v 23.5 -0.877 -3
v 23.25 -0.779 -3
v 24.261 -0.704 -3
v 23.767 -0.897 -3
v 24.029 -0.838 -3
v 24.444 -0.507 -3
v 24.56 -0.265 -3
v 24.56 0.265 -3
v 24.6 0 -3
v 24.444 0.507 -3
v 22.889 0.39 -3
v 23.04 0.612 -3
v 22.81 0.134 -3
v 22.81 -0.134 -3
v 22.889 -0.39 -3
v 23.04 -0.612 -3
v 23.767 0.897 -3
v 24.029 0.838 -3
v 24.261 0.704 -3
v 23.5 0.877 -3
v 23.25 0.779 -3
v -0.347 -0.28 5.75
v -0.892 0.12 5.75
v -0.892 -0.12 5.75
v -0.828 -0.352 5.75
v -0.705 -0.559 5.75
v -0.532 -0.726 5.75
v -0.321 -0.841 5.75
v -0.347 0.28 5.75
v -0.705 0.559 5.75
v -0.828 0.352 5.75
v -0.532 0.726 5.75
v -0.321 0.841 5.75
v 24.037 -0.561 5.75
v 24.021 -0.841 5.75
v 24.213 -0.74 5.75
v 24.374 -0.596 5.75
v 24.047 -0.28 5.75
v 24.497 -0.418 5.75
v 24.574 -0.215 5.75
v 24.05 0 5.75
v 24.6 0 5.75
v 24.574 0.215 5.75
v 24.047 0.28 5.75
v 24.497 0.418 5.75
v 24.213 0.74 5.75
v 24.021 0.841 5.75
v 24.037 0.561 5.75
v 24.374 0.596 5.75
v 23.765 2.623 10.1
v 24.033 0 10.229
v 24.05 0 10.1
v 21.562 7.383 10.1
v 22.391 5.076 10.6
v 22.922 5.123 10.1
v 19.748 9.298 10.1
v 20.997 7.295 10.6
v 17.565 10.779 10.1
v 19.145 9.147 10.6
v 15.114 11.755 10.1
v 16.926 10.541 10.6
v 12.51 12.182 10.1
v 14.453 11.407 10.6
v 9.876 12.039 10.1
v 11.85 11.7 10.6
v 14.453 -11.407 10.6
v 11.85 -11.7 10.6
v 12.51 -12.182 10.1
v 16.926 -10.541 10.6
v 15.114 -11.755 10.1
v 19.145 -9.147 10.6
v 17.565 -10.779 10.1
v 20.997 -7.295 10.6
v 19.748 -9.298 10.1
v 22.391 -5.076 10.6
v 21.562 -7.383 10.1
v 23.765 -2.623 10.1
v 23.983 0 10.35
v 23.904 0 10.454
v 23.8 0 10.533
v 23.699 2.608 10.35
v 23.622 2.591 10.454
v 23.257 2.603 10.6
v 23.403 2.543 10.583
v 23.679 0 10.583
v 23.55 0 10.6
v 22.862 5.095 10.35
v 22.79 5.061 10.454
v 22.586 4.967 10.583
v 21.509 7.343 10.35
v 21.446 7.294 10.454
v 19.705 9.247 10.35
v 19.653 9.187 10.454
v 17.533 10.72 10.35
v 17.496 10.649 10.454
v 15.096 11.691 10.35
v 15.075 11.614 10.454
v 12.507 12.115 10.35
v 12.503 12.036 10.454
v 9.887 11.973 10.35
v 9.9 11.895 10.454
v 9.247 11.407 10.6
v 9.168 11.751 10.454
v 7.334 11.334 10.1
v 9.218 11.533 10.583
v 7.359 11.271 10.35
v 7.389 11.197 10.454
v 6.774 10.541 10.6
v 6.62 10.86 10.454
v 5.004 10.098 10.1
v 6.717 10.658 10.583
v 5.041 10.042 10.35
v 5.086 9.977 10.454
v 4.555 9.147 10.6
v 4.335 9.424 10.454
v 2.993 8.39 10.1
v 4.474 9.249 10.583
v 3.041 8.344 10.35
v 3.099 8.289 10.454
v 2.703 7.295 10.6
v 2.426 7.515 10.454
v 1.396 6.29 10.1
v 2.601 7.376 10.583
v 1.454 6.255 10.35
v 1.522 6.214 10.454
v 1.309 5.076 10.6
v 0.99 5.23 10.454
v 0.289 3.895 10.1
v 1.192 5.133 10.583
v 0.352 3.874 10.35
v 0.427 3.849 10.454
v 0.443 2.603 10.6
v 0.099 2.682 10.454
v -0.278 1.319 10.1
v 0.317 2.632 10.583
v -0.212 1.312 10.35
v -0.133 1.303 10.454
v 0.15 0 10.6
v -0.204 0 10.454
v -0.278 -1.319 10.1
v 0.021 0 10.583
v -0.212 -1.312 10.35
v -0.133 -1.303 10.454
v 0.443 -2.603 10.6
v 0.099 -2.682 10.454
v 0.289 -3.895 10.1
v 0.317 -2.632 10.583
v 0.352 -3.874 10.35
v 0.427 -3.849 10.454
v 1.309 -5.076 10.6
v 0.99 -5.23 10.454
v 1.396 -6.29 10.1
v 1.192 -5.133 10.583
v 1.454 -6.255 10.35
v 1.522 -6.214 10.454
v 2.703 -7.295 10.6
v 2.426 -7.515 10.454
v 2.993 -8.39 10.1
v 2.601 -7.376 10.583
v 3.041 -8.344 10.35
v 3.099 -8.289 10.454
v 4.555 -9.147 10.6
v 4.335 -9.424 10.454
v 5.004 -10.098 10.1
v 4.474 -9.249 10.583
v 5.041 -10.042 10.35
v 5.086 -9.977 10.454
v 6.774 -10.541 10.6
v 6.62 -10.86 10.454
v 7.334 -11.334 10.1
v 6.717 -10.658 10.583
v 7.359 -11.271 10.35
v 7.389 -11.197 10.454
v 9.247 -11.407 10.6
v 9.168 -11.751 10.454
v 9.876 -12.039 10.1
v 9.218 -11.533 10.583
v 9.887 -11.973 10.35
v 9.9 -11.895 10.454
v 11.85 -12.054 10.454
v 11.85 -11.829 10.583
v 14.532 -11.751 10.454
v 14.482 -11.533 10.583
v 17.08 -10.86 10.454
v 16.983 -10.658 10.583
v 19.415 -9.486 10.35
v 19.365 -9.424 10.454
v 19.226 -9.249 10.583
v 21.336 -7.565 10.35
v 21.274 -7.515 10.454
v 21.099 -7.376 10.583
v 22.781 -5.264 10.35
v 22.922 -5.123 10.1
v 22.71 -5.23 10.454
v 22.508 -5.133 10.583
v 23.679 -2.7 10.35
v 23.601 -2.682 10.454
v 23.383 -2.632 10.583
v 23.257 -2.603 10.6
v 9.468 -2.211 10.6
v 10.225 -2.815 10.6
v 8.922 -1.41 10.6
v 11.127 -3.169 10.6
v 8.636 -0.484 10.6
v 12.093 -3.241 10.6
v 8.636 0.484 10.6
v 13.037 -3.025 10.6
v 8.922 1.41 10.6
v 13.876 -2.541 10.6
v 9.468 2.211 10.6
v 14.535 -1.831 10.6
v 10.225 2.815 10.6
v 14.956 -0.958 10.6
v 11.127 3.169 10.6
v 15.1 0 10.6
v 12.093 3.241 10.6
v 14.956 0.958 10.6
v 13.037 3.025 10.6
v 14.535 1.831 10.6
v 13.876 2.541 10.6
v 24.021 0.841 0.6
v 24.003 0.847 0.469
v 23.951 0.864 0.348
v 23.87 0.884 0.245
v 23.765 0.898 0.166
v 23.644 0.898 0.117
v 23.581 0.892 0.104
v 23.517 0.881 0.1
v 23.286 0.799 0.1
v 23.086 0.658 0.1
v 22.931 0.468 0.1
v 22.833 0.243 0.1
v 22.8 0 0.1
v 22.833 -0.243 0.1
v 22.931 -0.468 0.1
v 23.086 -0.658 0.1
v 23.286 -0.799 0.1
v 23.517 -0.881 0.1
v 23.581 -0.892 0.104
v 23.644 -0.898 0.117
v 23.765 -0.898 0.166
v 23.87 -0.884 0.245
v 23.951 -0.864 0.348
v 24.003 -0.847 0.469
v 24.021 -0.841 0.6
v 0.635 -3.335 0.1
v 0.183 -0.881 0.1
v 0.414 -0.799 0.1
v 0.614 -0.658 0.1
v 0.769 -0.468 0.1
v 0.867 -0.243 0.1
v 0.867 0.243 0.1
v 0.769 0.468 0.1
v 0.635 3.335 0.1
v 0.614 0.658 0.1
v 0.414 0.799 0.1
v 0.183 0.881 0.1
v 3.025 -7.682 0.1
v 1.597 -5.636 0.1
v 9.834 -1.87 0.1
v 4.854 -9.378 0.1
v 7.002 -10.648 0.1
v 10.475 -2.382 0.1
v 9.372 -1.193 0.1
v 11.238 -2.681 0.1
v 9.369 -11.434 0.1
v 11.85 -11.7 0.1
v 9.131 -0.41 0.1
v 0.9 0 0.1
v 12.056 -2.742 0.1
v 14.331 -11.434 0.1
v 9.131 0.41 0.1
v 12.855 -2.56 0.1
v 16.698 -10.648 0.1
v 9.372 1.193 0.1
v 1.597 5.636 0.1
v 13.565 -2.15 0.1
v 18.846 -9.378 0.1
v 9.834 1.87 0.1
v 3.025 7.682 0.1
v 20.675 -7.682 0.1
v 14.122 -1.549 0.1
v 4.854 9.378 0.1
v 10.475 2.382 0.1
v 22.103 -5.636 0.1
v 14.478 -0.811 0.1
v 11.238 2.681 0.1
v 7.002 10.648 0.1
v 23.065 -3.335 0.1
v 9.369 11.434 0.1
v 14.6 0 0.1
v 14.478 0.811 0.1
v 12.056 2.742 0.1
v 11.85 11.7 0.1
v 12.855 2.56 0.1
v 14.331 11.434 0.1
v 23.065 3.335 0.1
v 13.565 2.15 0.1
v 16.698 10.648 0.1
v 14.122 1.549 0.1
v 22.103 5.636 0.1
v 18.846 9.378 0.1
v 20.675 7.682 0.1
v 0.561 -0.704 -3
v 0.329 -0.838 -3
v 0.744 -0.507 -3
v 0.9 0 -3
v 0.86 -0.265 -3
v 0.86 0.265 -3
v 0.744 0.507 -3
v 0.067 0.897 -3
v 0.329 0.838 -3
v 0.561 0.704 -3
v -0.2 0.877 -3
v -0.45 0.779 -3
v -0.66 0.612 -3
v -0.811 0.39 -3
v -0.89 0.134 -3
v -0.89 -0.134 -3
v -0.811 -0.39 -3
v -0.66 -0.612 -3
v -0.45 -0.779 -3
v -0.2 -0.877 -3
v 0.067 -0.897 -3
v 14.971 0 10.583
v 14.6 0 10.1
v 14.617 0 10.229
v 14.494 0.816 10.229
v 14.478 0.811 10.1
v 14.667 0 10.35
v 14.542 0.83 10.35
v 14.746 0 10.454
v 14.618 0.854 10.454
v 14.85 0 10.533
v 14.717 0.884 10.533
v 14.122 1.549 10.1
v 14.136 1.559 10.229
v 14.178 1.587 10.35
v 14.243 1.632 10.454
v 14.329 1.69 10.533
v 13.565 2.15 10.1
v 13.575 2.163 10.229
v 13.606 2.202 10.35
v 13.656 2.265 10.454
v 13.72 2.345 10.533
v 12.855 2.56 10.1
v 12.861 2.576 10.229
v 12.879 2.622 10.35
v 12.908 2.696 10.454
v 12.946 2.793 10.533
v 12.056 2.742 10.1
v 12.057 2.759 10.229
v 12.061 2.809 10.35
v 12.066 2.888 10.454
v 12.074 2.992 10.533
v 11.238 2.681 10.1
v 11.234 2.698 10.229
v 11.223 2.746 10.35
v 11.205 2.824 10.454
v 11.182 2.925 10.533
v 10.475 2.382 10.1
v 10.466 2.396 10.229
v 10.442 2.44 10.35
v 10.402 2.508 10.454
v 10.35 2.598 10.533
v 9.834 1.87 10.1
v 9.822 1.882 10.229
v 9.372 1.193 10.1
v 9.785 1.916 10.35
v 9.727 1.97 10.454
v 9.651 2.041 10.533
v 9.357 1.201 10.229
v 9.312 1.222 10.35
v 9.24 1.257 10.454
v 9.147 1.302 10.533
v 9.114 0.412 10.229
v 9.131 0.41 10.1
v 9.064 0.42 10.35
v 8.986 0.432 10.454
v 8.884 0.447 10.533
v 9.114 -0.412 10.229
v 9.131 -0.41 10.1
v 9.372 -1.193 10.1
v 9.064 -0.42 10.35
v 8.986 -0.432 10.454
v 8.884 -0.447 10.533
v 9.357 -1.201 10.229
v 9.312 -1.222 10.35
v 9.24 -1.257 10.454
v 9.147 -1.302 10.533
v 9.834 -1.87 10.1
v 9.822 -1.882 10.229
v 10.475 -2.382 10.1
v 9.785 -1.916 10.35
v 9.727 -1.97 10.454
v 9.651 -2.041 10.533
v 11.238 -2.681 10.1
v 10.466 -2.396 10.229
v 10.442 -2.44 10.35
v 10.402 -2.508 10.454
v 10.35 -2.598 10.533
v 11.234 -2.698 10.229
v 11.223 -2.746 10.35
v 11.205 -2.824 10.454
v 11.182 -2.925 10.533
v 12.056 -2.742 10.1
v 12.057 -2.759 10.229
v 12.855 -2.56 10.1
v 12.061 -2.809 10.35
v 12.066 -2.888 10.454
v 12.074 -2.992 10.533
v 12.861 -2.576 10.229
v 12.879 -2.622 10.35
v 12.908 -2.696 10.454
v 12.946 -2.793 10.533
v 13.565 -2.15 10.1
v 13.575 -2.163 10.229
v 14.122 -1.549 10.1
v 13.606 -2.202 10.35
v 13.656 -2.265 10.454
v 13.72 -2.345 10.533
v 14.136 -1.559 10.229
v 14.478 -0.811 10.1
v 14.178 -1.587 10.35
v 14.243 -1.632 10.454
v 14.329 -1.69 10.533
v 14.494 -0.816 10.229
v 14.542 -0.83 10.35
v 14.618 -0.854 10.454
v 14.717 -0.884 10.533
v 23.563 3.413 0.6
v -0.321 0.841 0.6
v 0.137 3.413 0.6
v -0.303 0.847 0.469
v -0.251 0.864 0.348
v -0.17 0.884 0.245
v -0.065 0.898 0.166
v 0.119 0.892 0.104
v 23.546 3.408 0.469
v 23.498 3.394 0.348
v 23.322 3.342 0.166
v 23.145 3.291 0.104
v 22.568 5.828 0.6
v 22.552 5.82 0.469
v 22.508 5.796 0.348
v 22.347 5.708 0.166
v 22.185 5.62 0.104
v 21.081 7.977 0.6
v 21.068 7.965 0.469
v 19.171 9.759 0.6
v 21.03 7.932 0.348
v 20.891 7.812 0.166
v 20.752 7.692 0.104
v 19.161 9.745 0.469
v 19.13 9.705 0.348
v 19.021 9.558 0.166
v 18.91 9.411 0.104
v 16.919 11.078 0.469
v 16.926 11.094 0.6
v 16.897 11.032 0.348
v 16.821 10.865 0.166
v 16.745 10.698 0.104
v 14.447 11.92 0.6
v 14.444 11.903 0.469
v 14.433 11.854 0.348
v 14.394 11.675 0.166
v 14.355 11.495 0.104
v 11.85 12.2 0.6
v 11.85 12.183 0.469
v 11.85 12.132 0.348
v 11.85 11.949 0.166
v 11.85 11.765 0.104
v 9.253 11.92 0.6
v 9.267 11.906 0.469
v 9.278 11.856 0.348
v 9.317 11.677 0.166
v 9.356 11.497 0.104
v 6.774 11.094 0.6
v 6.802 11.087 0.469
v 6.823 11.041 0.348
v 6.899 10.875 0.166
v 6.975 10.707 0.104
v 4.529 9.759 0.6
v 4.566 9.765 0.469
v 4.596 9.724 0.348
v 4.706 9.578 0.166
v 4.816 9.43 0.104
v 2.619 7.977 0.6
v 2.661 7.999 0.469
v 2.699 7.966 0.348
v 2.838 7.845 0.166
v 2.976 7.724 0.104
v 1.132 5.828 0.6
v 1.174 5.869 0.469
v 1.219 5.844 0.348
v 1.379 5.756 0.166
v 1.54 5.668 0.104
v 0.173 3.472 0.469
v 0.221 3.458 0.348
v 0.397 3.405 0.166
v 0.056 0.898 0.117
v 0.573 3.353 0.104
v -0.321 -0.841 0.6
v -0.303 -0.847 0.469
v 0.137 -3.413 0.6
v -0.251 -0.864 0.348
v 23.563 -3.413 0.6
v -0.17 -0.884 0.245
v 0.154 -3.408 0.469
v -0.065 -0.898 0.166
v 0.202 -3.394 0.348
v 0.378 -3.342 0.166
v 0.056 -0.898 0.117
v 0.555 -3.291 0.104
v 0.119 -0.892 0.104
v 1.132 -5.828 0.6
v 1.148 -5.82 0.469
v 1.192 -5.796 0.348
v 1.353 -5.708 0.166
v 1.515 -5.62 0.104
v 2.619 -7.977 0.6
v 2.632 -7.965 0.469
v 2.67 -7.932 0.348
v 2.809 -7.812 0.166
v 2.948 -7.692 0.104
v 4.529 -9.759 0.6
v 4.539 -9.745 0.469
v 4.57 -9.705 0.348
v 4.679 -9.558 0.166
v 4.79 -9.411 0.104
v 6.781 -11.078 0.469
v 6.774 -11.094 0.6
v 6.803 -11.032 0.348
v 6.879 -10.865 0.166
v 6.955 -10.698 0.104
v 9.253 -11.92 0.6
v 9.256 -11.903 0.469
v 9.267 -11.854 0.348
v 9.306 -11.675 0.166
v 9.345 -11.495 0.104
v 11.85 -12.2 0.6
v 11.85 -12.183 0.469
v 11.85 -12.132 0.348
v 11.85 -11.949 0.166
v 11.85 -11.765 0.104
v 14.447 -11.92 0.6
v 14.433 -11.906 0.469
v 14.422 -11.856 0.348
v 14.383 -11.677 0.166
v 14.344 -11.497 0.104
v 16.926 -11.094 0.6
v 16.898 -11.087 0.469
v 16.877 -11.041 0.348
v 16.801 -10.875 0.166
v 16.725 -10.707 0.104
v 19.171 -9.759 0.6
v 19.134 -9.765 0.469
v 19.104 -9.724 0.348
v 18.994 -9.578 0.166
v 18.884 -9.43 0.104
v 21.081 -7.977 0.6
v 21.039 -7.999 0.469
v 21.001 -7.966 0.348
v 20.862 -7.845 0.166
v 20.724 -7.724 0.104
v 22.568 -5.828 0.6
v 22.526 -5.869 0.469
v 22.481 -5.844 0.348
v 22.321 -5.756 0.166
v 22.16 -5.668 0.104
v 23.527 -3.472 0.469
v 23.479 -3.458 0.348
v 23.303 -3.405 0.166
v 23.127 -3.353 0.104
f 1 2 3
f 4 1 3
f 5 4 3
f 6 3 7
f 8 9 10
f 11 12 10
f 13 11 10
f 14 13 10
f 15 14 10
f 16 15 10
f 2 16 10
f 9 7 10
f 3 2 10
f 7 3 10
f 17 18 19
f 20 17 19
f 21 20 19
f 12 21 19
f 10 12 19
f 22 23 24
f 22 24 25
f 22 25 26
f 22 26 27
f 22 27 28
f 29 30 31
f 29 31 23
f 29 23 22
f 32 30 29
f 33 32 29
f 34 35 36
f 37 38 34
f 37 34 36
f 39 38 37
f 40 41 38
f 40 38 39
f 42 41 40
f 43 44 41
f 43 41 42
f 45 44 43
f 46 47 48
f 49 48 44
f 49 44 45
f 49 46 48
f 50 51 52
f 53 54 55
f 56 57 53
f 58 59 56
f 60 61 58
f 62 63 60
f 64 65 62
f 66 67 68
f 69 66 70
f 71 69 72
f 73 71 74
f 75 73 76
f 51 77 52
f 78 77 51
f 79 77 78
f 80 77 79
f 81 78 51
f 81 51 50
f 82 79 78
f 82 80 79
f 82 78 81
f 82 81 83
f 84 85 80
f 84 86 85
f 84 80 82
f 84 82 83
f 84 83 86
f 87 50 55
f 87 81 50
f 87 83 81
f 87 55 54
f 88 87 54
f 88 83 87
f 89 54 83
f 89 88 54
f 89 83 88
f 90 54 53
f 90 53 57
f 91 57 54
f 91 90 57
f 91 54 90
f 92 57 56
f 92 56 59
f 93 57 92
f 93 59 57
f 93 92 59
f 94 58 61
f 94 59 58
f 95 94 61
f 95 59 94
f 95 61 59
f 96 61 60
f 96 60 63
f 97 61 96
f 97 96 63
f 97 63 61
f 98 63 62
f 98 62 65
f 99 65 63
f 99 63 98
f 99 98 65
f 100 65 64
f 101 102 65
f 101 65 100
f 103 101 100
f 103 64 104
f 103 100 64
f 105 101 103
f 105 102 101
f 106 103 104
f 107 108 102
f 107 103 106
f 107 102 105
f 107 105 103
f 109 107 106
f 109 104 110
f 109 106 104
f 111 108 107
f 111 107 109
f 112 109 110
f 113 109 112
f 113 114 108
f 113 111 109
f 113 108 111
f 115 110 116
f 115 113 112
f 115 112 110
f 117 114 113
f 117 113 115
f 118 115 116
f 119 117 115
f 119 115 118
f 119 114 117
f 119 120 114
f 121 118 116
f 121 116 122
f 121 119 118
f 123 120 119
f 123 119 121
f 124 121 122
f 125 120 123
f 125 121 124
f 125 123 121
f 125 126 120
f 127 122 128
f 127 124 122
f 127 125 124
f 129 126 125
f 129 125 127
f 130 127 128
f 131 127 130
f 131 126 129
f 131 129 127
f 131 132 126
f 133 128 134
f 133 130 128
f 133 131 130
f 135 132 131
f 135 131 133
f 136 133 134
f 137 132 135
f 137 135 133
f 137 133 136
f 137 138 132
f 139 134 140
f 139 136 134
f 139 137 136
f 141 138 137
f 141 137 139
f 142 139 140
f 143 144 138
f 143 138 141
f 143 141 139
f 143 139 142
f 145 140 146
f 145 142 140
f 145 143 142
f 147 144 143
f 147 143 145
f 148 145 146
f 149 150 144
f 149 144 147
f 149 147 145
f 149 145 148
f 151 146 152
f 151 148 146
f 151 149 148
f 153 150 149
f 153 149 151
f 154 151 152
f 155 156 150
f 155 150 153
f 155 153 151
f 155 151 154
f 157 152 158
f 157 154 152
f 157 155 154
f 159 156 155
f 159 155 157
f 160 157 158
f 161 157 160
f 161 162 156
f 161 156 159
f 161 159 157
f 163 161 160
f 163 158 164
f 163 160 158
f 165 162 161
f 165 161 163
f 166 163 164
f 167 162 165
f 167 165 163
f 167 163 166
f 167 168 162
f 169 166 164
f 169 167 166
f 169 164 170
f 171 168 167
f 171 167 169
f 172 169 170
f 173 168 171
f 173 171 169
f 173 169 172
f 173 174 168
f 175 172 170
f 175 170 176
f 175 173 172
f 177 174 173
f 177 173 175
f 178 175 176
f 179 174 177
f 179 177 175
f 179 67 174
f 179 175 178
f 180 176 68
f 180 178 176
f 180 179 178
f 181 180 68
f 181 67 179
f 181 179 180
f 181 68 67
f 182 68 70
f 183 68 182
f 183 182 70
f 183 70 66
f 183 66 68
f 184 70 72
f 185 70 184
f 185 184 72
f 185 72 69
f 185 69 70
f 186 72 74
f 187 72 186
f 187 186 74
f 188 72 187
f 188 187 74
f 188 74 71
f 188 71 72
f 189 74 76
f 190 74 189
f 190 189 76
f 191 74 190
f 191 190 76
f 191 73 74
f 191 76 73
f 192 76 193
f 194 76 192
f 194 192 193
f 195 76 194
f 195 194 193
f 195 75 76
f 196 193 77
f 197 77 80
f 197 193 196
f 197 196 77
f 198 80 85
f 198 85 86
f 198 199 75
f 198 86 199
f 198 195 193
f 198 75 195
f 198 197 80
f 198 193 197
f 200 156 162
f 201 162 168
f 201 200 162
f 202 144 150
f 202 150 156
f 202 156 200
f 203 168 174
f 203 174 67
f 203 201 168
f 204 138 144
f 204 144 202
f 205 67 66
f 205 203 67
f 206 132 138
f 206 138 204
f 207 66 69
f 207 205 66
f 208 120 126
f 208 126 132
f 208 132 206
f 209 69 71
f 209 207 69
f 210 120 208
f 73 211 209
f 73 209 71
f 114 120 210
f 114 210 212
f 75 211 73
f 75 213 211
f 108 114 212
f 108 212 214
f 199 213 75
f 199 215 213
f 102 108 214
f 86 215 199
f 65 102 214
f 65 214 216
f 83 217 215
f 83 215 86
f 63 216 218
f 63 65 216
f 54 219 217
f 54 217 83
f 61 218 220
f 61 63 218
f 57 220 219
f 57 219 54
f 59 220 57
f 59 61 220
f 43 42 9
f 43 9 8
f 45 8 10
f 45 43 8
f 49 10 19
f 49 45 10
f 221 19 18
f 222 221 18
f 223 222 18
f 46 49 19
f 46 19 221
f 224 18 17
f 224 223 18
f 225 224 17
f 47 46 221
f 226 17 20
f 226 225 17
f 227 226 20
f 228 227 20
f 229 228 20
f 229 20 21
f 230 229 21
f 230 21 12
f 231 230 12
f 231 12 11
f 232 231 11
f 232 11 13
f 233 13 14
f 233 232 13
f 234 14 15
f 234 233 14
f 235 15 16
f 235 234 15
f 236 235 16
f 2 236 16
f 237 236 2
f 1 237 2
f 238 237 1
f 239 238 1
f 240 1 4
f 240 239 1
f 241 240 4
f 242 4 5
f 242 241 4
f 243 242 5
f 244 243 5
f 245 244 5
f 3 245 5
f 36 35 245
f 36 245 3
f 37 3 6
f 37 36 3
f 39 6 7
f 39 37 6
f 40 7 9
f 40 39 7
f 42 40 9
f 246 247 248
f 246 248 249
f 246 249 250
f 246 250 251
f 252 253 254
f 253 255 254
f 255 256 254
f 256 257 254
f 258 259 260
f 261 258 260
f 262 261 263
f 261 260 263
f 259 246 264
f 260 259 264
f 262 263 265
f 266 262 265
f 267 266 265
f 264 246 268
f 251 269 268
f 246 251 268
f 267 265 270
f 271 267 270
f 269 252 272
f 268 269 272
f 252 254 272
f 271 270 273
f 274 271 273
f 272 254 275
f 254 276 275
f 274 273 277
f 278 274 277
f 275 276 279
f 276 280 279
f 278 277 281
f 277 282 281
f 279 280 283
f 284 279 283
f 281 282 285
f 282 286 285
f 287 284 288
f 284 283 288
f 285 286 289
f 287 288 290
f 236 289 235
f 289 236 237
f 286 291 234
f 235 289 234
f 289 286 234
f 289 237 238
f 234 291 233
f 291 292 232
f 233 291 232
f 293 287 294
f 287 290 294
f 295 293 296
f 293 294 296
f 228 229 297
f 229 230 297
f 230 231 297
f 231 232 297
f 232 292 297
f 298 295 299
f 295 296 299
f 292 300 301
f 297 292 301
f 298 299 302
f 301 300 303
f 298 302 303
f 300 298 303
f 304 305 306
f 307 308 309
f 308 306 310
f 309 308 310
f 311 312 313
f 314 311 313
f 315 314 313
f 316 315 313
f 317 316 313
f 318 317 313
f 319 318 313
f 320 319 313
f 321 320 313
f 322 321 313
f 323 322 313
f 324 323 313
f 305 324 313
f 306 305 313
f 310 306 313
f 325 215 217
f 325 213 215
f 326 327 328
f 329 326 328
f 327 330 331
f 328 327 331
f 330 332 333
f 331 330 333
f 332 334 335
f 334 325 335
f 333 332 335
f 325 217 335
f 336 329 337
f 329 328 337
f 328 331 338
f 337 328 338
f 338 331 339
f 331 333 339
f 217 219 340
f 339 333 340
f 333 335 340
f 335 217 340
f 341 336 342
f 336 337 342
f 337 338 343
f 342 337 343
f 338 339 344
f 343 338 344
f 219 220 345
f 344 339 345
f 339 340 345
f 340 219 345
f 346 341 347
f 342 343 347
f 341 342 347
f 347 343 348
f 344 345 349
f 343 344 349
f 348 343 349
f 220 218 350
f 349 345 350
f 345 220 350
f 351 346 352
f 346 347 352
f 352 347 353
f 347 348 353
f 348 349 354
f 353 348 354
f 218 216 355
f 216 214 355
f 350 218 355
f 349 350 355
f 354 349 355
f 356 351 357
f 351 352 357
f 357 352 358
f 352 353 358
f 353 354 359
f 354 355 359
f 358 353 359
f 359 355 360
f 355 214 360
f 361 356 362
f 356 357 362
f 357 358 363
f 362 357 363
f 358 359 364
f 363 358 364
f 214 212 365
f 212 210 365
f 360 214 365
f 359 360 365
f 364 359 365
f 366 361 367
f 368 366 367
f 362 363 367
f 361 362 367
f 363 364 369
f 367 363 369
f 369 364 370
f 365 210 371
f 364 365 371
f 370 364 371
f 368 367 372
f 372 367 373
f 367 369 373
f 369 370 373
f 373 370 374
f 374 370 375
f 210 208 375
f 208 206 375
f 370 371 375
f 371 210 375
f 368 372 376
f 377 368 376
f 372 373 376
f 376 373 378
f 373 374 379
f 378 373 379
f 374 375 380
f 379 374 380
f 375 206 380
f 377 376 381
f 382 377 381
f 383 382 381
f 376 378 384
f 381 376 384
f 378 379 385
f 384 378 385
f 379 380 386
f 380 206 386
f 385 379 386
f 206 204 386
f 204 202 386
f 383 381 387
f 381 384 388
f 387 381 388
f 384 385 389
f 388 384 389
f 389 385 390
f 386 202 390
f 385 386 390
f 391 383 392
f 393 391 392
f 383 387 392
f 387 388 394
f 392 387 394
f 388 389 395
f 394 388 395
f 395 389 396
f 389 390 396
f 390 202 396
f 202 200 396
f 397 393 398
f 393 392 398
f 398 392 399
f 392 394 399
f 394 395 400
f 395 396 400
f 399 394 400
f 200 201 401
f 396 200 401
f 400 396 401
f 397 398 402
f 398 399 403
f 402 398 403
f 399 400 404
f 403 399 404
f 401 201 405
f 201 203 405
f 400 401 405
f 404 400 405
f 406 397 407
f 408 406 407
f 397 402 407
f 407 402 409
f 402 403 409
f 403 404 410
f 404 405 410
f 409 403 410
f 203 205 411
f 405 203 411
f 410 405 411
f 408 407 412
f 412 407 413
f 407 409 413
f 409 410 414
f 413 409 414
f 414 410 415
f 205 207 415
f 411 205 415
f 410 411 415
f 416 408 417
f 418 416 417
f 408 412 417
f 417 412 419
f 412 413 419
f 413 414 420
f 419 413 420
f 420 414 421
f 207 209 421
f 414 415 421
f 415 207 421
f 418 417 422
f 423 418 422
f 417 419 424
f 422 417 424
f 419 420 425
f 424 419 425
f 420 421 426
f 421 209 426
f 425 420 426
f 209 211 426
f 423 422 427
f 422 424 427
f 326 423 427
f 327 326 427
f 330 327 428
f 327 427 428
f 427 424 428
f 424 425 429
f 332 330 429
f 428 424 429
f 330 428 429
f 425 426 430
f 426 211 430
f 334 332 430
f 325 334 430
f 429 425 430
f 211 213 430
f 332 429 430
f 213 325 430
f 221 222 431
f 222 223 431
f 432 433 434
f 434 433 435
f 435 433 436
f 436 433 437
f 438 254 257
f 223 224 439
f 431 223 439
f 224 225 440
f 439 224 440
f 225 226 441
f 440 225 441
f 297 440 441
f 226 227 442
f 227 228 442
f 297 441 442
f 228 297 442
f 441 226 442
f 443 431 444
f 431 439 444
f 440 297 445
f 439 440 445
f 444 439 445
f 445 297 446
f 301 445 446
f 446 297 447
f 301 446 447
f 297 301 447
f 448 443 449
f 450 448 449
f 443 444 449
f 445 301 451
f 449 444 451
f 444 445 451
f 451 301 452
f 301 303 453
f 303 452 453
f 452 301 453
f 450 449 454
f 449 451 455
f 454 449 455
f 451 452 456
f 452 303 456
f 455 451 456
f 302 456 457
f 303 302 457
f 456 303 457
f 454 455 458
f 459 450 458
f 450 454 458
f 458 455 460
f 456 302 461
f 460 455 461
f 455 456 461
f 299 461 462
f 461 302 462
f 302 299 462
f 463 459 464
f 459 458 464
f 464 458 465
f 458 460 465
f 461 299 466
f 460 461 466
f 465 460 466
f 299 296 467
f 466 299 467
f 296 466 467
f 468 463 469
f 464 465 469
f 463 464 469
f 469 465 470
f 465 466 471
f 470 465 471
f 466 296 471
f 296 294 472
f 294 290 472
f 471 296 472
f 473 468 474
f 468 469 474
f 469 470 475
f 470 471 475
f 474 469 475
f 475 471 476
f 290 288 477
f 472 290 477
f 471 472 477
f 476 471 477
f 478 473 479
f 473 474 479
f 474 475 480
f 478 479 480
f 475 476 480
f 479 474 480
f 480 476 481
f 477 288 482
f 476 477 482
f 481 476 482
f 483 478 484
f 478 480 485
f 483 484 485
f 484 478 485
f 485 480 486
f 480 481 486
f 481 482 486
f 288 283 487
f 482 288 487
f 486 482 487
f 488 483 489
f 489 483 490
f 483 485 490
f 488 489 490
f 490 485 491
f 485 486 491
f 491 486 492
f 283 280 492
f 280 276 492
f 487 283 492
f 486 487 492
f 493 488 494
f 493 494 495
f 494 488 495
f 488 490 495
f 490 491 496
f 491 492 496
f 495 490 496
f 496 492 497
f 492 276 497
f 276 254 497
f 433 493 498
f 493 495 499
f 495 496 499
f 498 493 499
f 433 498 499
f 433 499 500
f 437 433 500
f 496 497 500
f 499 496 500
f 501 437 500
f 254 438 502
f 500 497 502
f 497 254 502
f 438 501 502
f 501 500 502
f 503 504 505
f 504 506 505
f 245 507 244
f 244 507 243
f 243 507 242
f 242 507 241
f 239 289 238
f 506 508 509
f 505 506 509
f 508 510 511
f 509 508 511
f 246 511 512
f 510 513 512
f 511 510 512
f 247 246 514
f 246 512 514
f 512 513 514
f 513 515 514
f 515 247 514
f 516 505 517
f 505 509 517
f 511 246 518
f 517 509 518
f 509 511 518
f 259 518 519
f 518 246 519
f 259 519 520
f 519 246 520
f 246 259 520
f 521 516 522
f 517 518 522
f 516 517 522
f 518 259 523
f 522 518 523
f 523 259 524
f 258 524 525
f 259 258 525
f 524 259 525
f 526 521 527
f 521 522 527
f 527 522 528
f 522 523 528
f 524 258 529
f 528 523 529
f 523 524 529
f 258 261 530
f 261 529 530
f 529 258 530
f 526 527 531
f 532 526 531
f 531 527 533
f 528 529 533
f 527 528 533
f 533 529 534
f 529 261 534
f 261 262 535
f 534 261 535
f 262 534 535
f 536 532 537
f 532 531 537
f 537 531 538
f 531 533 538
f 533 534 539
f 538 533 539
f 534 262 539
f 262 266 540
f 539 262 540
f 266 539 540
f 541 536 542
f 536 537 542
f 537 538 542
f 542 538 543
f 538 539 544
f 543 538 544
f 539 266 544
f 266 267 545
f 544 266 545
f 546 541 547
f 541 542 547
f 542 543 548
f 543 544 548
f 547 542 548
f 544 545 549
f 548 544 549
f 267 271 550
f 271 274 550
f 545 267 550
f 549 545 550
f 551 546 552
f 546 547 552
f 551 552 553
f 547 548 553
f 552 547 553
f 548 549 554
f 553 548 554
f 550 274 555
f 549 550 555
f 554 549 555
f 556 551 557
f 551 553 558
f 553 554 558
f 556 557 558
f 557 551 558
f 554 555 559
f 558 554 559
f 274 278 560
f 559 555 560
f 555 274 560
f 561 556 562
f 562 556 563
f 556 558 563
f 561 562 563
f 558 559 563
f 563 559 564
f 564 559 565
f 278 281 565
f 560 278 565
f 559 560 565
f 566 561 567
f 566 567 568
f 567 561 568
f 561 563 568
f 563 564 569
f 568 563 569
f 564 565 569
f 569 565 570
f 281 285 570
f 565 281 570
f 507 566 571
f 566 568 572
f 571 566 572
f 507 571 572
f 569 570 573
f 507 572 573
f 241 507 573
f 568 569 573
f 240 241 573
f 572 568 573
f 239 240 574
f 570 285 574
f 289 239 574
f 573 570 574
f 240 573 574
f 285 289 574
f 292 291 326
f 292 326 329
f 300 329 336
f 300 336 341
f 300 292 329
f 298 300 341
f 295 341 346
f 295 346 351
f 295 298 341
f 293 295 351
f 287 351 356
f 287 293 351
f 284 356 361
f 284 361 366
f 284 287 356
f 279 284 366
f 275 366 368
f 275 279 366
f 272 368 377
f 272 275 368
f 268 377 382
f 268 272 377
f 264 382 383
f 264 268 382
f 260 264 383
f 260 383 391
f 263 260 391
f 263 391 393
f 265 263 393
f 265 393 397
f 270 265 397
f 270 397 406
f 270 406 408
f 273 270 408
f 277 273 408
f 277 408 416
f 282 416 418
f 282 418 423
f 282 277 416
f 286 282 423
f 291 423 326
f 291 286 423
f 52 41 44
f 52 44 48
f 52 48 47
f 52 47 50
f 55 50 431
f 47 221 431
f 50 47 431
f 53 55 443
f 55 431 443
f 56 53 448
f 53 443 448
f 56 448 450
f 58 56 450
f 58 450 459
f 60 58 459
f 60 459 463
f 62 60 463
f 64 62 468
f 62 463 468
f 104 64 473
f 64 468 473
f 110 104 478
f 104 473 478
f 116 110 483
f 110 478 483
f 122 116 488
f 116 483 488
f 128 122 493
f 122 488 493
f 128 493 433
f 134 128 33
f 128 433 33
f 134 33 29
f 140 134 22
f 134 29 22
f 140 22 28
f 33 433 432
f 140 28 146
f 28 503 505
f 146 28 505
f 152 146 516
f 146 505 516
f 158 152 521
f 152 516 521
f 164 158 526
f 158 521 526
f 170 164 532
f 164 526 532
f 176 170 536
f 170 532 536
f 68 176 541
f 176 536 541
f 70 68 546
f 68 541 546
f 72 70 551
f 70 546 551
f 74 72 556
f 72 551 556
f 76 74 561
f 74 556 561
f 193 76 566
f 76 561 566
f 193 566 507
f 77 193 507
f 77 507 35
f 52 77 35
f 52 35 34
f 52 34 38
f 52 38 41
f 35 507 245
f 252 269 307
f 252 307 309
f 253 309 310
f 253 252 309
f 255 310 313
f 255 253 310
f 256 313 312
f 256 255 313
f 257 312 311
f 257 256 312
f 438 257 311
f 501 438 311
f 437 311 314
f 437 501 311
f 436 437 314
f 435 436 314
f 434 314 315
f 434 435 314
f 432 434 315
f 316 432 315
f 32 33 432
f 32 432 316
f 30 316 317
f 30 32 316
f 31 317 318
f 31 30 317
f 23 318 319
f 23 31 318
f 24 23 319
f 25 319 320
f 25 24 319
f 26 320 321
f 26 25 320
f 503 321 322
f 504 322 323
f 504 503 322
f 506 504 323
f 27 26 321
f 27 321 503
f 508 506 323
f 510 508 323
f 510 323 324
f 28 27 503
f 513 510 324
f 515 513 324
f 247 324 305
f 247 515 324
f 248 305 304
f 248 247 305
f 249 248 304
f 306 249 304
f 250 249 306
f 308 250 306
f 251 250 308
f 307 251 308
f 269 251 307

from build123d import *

# Parameters (mm, degrees)
SKETCH001_R       = 0.9
PAD001_DEPTH      = 5.25
PAD001_DEPTH_BACK = 3.5
SKETCH_R          = 12.2
SKETCH_R_2        = 2.75
PAD_DEPTH         = 10.5
FILLET_R          = 0.5


with BuildPart() as pad001:
    # Sketch001 → Pad001 (new body, two sides)
    with BuildSketch(Plane.XY.offset(0.5)) as pad001_sk:
        Circle(SKETCH001_R)
        with Locations((23.7, 0)):
            Circle(SKETCH001_R)
    extrude(amount=PAD001_DEPTH)
    extrude(pad001_sk.sketch, amount=-PAD001_DEPTH_BACK)


with BuildPart() as fillet_mp_cp:
    # Sketch → Pad (new body)
    with BuildSketch(Plane.XY.offset(0.1)):
        with Locations((11.85, 0)):
            Circle(SKETCH_R)
        with Locations((11.85, 0)):
            Circle(SKETCH_R_2, mode=Mode.SUBTRACT)
    extrude(amount=PAD_DEPTH)

    # Fillet
    fillet_edges = [fillet_mp_cp.edges().sort_by_distance(p)[0] for p in [
        (9.1, 0, 10.6),
        (-0.35, 0, 10.6),
        (-0.35, 0, 0.1),
    ]]
    fillet(fillet_edges, radius=FILLET_R)

    # Fillet_mp_cp: union Pad001
    add(pad001.part)


solid = fillet_mp_cp.part
